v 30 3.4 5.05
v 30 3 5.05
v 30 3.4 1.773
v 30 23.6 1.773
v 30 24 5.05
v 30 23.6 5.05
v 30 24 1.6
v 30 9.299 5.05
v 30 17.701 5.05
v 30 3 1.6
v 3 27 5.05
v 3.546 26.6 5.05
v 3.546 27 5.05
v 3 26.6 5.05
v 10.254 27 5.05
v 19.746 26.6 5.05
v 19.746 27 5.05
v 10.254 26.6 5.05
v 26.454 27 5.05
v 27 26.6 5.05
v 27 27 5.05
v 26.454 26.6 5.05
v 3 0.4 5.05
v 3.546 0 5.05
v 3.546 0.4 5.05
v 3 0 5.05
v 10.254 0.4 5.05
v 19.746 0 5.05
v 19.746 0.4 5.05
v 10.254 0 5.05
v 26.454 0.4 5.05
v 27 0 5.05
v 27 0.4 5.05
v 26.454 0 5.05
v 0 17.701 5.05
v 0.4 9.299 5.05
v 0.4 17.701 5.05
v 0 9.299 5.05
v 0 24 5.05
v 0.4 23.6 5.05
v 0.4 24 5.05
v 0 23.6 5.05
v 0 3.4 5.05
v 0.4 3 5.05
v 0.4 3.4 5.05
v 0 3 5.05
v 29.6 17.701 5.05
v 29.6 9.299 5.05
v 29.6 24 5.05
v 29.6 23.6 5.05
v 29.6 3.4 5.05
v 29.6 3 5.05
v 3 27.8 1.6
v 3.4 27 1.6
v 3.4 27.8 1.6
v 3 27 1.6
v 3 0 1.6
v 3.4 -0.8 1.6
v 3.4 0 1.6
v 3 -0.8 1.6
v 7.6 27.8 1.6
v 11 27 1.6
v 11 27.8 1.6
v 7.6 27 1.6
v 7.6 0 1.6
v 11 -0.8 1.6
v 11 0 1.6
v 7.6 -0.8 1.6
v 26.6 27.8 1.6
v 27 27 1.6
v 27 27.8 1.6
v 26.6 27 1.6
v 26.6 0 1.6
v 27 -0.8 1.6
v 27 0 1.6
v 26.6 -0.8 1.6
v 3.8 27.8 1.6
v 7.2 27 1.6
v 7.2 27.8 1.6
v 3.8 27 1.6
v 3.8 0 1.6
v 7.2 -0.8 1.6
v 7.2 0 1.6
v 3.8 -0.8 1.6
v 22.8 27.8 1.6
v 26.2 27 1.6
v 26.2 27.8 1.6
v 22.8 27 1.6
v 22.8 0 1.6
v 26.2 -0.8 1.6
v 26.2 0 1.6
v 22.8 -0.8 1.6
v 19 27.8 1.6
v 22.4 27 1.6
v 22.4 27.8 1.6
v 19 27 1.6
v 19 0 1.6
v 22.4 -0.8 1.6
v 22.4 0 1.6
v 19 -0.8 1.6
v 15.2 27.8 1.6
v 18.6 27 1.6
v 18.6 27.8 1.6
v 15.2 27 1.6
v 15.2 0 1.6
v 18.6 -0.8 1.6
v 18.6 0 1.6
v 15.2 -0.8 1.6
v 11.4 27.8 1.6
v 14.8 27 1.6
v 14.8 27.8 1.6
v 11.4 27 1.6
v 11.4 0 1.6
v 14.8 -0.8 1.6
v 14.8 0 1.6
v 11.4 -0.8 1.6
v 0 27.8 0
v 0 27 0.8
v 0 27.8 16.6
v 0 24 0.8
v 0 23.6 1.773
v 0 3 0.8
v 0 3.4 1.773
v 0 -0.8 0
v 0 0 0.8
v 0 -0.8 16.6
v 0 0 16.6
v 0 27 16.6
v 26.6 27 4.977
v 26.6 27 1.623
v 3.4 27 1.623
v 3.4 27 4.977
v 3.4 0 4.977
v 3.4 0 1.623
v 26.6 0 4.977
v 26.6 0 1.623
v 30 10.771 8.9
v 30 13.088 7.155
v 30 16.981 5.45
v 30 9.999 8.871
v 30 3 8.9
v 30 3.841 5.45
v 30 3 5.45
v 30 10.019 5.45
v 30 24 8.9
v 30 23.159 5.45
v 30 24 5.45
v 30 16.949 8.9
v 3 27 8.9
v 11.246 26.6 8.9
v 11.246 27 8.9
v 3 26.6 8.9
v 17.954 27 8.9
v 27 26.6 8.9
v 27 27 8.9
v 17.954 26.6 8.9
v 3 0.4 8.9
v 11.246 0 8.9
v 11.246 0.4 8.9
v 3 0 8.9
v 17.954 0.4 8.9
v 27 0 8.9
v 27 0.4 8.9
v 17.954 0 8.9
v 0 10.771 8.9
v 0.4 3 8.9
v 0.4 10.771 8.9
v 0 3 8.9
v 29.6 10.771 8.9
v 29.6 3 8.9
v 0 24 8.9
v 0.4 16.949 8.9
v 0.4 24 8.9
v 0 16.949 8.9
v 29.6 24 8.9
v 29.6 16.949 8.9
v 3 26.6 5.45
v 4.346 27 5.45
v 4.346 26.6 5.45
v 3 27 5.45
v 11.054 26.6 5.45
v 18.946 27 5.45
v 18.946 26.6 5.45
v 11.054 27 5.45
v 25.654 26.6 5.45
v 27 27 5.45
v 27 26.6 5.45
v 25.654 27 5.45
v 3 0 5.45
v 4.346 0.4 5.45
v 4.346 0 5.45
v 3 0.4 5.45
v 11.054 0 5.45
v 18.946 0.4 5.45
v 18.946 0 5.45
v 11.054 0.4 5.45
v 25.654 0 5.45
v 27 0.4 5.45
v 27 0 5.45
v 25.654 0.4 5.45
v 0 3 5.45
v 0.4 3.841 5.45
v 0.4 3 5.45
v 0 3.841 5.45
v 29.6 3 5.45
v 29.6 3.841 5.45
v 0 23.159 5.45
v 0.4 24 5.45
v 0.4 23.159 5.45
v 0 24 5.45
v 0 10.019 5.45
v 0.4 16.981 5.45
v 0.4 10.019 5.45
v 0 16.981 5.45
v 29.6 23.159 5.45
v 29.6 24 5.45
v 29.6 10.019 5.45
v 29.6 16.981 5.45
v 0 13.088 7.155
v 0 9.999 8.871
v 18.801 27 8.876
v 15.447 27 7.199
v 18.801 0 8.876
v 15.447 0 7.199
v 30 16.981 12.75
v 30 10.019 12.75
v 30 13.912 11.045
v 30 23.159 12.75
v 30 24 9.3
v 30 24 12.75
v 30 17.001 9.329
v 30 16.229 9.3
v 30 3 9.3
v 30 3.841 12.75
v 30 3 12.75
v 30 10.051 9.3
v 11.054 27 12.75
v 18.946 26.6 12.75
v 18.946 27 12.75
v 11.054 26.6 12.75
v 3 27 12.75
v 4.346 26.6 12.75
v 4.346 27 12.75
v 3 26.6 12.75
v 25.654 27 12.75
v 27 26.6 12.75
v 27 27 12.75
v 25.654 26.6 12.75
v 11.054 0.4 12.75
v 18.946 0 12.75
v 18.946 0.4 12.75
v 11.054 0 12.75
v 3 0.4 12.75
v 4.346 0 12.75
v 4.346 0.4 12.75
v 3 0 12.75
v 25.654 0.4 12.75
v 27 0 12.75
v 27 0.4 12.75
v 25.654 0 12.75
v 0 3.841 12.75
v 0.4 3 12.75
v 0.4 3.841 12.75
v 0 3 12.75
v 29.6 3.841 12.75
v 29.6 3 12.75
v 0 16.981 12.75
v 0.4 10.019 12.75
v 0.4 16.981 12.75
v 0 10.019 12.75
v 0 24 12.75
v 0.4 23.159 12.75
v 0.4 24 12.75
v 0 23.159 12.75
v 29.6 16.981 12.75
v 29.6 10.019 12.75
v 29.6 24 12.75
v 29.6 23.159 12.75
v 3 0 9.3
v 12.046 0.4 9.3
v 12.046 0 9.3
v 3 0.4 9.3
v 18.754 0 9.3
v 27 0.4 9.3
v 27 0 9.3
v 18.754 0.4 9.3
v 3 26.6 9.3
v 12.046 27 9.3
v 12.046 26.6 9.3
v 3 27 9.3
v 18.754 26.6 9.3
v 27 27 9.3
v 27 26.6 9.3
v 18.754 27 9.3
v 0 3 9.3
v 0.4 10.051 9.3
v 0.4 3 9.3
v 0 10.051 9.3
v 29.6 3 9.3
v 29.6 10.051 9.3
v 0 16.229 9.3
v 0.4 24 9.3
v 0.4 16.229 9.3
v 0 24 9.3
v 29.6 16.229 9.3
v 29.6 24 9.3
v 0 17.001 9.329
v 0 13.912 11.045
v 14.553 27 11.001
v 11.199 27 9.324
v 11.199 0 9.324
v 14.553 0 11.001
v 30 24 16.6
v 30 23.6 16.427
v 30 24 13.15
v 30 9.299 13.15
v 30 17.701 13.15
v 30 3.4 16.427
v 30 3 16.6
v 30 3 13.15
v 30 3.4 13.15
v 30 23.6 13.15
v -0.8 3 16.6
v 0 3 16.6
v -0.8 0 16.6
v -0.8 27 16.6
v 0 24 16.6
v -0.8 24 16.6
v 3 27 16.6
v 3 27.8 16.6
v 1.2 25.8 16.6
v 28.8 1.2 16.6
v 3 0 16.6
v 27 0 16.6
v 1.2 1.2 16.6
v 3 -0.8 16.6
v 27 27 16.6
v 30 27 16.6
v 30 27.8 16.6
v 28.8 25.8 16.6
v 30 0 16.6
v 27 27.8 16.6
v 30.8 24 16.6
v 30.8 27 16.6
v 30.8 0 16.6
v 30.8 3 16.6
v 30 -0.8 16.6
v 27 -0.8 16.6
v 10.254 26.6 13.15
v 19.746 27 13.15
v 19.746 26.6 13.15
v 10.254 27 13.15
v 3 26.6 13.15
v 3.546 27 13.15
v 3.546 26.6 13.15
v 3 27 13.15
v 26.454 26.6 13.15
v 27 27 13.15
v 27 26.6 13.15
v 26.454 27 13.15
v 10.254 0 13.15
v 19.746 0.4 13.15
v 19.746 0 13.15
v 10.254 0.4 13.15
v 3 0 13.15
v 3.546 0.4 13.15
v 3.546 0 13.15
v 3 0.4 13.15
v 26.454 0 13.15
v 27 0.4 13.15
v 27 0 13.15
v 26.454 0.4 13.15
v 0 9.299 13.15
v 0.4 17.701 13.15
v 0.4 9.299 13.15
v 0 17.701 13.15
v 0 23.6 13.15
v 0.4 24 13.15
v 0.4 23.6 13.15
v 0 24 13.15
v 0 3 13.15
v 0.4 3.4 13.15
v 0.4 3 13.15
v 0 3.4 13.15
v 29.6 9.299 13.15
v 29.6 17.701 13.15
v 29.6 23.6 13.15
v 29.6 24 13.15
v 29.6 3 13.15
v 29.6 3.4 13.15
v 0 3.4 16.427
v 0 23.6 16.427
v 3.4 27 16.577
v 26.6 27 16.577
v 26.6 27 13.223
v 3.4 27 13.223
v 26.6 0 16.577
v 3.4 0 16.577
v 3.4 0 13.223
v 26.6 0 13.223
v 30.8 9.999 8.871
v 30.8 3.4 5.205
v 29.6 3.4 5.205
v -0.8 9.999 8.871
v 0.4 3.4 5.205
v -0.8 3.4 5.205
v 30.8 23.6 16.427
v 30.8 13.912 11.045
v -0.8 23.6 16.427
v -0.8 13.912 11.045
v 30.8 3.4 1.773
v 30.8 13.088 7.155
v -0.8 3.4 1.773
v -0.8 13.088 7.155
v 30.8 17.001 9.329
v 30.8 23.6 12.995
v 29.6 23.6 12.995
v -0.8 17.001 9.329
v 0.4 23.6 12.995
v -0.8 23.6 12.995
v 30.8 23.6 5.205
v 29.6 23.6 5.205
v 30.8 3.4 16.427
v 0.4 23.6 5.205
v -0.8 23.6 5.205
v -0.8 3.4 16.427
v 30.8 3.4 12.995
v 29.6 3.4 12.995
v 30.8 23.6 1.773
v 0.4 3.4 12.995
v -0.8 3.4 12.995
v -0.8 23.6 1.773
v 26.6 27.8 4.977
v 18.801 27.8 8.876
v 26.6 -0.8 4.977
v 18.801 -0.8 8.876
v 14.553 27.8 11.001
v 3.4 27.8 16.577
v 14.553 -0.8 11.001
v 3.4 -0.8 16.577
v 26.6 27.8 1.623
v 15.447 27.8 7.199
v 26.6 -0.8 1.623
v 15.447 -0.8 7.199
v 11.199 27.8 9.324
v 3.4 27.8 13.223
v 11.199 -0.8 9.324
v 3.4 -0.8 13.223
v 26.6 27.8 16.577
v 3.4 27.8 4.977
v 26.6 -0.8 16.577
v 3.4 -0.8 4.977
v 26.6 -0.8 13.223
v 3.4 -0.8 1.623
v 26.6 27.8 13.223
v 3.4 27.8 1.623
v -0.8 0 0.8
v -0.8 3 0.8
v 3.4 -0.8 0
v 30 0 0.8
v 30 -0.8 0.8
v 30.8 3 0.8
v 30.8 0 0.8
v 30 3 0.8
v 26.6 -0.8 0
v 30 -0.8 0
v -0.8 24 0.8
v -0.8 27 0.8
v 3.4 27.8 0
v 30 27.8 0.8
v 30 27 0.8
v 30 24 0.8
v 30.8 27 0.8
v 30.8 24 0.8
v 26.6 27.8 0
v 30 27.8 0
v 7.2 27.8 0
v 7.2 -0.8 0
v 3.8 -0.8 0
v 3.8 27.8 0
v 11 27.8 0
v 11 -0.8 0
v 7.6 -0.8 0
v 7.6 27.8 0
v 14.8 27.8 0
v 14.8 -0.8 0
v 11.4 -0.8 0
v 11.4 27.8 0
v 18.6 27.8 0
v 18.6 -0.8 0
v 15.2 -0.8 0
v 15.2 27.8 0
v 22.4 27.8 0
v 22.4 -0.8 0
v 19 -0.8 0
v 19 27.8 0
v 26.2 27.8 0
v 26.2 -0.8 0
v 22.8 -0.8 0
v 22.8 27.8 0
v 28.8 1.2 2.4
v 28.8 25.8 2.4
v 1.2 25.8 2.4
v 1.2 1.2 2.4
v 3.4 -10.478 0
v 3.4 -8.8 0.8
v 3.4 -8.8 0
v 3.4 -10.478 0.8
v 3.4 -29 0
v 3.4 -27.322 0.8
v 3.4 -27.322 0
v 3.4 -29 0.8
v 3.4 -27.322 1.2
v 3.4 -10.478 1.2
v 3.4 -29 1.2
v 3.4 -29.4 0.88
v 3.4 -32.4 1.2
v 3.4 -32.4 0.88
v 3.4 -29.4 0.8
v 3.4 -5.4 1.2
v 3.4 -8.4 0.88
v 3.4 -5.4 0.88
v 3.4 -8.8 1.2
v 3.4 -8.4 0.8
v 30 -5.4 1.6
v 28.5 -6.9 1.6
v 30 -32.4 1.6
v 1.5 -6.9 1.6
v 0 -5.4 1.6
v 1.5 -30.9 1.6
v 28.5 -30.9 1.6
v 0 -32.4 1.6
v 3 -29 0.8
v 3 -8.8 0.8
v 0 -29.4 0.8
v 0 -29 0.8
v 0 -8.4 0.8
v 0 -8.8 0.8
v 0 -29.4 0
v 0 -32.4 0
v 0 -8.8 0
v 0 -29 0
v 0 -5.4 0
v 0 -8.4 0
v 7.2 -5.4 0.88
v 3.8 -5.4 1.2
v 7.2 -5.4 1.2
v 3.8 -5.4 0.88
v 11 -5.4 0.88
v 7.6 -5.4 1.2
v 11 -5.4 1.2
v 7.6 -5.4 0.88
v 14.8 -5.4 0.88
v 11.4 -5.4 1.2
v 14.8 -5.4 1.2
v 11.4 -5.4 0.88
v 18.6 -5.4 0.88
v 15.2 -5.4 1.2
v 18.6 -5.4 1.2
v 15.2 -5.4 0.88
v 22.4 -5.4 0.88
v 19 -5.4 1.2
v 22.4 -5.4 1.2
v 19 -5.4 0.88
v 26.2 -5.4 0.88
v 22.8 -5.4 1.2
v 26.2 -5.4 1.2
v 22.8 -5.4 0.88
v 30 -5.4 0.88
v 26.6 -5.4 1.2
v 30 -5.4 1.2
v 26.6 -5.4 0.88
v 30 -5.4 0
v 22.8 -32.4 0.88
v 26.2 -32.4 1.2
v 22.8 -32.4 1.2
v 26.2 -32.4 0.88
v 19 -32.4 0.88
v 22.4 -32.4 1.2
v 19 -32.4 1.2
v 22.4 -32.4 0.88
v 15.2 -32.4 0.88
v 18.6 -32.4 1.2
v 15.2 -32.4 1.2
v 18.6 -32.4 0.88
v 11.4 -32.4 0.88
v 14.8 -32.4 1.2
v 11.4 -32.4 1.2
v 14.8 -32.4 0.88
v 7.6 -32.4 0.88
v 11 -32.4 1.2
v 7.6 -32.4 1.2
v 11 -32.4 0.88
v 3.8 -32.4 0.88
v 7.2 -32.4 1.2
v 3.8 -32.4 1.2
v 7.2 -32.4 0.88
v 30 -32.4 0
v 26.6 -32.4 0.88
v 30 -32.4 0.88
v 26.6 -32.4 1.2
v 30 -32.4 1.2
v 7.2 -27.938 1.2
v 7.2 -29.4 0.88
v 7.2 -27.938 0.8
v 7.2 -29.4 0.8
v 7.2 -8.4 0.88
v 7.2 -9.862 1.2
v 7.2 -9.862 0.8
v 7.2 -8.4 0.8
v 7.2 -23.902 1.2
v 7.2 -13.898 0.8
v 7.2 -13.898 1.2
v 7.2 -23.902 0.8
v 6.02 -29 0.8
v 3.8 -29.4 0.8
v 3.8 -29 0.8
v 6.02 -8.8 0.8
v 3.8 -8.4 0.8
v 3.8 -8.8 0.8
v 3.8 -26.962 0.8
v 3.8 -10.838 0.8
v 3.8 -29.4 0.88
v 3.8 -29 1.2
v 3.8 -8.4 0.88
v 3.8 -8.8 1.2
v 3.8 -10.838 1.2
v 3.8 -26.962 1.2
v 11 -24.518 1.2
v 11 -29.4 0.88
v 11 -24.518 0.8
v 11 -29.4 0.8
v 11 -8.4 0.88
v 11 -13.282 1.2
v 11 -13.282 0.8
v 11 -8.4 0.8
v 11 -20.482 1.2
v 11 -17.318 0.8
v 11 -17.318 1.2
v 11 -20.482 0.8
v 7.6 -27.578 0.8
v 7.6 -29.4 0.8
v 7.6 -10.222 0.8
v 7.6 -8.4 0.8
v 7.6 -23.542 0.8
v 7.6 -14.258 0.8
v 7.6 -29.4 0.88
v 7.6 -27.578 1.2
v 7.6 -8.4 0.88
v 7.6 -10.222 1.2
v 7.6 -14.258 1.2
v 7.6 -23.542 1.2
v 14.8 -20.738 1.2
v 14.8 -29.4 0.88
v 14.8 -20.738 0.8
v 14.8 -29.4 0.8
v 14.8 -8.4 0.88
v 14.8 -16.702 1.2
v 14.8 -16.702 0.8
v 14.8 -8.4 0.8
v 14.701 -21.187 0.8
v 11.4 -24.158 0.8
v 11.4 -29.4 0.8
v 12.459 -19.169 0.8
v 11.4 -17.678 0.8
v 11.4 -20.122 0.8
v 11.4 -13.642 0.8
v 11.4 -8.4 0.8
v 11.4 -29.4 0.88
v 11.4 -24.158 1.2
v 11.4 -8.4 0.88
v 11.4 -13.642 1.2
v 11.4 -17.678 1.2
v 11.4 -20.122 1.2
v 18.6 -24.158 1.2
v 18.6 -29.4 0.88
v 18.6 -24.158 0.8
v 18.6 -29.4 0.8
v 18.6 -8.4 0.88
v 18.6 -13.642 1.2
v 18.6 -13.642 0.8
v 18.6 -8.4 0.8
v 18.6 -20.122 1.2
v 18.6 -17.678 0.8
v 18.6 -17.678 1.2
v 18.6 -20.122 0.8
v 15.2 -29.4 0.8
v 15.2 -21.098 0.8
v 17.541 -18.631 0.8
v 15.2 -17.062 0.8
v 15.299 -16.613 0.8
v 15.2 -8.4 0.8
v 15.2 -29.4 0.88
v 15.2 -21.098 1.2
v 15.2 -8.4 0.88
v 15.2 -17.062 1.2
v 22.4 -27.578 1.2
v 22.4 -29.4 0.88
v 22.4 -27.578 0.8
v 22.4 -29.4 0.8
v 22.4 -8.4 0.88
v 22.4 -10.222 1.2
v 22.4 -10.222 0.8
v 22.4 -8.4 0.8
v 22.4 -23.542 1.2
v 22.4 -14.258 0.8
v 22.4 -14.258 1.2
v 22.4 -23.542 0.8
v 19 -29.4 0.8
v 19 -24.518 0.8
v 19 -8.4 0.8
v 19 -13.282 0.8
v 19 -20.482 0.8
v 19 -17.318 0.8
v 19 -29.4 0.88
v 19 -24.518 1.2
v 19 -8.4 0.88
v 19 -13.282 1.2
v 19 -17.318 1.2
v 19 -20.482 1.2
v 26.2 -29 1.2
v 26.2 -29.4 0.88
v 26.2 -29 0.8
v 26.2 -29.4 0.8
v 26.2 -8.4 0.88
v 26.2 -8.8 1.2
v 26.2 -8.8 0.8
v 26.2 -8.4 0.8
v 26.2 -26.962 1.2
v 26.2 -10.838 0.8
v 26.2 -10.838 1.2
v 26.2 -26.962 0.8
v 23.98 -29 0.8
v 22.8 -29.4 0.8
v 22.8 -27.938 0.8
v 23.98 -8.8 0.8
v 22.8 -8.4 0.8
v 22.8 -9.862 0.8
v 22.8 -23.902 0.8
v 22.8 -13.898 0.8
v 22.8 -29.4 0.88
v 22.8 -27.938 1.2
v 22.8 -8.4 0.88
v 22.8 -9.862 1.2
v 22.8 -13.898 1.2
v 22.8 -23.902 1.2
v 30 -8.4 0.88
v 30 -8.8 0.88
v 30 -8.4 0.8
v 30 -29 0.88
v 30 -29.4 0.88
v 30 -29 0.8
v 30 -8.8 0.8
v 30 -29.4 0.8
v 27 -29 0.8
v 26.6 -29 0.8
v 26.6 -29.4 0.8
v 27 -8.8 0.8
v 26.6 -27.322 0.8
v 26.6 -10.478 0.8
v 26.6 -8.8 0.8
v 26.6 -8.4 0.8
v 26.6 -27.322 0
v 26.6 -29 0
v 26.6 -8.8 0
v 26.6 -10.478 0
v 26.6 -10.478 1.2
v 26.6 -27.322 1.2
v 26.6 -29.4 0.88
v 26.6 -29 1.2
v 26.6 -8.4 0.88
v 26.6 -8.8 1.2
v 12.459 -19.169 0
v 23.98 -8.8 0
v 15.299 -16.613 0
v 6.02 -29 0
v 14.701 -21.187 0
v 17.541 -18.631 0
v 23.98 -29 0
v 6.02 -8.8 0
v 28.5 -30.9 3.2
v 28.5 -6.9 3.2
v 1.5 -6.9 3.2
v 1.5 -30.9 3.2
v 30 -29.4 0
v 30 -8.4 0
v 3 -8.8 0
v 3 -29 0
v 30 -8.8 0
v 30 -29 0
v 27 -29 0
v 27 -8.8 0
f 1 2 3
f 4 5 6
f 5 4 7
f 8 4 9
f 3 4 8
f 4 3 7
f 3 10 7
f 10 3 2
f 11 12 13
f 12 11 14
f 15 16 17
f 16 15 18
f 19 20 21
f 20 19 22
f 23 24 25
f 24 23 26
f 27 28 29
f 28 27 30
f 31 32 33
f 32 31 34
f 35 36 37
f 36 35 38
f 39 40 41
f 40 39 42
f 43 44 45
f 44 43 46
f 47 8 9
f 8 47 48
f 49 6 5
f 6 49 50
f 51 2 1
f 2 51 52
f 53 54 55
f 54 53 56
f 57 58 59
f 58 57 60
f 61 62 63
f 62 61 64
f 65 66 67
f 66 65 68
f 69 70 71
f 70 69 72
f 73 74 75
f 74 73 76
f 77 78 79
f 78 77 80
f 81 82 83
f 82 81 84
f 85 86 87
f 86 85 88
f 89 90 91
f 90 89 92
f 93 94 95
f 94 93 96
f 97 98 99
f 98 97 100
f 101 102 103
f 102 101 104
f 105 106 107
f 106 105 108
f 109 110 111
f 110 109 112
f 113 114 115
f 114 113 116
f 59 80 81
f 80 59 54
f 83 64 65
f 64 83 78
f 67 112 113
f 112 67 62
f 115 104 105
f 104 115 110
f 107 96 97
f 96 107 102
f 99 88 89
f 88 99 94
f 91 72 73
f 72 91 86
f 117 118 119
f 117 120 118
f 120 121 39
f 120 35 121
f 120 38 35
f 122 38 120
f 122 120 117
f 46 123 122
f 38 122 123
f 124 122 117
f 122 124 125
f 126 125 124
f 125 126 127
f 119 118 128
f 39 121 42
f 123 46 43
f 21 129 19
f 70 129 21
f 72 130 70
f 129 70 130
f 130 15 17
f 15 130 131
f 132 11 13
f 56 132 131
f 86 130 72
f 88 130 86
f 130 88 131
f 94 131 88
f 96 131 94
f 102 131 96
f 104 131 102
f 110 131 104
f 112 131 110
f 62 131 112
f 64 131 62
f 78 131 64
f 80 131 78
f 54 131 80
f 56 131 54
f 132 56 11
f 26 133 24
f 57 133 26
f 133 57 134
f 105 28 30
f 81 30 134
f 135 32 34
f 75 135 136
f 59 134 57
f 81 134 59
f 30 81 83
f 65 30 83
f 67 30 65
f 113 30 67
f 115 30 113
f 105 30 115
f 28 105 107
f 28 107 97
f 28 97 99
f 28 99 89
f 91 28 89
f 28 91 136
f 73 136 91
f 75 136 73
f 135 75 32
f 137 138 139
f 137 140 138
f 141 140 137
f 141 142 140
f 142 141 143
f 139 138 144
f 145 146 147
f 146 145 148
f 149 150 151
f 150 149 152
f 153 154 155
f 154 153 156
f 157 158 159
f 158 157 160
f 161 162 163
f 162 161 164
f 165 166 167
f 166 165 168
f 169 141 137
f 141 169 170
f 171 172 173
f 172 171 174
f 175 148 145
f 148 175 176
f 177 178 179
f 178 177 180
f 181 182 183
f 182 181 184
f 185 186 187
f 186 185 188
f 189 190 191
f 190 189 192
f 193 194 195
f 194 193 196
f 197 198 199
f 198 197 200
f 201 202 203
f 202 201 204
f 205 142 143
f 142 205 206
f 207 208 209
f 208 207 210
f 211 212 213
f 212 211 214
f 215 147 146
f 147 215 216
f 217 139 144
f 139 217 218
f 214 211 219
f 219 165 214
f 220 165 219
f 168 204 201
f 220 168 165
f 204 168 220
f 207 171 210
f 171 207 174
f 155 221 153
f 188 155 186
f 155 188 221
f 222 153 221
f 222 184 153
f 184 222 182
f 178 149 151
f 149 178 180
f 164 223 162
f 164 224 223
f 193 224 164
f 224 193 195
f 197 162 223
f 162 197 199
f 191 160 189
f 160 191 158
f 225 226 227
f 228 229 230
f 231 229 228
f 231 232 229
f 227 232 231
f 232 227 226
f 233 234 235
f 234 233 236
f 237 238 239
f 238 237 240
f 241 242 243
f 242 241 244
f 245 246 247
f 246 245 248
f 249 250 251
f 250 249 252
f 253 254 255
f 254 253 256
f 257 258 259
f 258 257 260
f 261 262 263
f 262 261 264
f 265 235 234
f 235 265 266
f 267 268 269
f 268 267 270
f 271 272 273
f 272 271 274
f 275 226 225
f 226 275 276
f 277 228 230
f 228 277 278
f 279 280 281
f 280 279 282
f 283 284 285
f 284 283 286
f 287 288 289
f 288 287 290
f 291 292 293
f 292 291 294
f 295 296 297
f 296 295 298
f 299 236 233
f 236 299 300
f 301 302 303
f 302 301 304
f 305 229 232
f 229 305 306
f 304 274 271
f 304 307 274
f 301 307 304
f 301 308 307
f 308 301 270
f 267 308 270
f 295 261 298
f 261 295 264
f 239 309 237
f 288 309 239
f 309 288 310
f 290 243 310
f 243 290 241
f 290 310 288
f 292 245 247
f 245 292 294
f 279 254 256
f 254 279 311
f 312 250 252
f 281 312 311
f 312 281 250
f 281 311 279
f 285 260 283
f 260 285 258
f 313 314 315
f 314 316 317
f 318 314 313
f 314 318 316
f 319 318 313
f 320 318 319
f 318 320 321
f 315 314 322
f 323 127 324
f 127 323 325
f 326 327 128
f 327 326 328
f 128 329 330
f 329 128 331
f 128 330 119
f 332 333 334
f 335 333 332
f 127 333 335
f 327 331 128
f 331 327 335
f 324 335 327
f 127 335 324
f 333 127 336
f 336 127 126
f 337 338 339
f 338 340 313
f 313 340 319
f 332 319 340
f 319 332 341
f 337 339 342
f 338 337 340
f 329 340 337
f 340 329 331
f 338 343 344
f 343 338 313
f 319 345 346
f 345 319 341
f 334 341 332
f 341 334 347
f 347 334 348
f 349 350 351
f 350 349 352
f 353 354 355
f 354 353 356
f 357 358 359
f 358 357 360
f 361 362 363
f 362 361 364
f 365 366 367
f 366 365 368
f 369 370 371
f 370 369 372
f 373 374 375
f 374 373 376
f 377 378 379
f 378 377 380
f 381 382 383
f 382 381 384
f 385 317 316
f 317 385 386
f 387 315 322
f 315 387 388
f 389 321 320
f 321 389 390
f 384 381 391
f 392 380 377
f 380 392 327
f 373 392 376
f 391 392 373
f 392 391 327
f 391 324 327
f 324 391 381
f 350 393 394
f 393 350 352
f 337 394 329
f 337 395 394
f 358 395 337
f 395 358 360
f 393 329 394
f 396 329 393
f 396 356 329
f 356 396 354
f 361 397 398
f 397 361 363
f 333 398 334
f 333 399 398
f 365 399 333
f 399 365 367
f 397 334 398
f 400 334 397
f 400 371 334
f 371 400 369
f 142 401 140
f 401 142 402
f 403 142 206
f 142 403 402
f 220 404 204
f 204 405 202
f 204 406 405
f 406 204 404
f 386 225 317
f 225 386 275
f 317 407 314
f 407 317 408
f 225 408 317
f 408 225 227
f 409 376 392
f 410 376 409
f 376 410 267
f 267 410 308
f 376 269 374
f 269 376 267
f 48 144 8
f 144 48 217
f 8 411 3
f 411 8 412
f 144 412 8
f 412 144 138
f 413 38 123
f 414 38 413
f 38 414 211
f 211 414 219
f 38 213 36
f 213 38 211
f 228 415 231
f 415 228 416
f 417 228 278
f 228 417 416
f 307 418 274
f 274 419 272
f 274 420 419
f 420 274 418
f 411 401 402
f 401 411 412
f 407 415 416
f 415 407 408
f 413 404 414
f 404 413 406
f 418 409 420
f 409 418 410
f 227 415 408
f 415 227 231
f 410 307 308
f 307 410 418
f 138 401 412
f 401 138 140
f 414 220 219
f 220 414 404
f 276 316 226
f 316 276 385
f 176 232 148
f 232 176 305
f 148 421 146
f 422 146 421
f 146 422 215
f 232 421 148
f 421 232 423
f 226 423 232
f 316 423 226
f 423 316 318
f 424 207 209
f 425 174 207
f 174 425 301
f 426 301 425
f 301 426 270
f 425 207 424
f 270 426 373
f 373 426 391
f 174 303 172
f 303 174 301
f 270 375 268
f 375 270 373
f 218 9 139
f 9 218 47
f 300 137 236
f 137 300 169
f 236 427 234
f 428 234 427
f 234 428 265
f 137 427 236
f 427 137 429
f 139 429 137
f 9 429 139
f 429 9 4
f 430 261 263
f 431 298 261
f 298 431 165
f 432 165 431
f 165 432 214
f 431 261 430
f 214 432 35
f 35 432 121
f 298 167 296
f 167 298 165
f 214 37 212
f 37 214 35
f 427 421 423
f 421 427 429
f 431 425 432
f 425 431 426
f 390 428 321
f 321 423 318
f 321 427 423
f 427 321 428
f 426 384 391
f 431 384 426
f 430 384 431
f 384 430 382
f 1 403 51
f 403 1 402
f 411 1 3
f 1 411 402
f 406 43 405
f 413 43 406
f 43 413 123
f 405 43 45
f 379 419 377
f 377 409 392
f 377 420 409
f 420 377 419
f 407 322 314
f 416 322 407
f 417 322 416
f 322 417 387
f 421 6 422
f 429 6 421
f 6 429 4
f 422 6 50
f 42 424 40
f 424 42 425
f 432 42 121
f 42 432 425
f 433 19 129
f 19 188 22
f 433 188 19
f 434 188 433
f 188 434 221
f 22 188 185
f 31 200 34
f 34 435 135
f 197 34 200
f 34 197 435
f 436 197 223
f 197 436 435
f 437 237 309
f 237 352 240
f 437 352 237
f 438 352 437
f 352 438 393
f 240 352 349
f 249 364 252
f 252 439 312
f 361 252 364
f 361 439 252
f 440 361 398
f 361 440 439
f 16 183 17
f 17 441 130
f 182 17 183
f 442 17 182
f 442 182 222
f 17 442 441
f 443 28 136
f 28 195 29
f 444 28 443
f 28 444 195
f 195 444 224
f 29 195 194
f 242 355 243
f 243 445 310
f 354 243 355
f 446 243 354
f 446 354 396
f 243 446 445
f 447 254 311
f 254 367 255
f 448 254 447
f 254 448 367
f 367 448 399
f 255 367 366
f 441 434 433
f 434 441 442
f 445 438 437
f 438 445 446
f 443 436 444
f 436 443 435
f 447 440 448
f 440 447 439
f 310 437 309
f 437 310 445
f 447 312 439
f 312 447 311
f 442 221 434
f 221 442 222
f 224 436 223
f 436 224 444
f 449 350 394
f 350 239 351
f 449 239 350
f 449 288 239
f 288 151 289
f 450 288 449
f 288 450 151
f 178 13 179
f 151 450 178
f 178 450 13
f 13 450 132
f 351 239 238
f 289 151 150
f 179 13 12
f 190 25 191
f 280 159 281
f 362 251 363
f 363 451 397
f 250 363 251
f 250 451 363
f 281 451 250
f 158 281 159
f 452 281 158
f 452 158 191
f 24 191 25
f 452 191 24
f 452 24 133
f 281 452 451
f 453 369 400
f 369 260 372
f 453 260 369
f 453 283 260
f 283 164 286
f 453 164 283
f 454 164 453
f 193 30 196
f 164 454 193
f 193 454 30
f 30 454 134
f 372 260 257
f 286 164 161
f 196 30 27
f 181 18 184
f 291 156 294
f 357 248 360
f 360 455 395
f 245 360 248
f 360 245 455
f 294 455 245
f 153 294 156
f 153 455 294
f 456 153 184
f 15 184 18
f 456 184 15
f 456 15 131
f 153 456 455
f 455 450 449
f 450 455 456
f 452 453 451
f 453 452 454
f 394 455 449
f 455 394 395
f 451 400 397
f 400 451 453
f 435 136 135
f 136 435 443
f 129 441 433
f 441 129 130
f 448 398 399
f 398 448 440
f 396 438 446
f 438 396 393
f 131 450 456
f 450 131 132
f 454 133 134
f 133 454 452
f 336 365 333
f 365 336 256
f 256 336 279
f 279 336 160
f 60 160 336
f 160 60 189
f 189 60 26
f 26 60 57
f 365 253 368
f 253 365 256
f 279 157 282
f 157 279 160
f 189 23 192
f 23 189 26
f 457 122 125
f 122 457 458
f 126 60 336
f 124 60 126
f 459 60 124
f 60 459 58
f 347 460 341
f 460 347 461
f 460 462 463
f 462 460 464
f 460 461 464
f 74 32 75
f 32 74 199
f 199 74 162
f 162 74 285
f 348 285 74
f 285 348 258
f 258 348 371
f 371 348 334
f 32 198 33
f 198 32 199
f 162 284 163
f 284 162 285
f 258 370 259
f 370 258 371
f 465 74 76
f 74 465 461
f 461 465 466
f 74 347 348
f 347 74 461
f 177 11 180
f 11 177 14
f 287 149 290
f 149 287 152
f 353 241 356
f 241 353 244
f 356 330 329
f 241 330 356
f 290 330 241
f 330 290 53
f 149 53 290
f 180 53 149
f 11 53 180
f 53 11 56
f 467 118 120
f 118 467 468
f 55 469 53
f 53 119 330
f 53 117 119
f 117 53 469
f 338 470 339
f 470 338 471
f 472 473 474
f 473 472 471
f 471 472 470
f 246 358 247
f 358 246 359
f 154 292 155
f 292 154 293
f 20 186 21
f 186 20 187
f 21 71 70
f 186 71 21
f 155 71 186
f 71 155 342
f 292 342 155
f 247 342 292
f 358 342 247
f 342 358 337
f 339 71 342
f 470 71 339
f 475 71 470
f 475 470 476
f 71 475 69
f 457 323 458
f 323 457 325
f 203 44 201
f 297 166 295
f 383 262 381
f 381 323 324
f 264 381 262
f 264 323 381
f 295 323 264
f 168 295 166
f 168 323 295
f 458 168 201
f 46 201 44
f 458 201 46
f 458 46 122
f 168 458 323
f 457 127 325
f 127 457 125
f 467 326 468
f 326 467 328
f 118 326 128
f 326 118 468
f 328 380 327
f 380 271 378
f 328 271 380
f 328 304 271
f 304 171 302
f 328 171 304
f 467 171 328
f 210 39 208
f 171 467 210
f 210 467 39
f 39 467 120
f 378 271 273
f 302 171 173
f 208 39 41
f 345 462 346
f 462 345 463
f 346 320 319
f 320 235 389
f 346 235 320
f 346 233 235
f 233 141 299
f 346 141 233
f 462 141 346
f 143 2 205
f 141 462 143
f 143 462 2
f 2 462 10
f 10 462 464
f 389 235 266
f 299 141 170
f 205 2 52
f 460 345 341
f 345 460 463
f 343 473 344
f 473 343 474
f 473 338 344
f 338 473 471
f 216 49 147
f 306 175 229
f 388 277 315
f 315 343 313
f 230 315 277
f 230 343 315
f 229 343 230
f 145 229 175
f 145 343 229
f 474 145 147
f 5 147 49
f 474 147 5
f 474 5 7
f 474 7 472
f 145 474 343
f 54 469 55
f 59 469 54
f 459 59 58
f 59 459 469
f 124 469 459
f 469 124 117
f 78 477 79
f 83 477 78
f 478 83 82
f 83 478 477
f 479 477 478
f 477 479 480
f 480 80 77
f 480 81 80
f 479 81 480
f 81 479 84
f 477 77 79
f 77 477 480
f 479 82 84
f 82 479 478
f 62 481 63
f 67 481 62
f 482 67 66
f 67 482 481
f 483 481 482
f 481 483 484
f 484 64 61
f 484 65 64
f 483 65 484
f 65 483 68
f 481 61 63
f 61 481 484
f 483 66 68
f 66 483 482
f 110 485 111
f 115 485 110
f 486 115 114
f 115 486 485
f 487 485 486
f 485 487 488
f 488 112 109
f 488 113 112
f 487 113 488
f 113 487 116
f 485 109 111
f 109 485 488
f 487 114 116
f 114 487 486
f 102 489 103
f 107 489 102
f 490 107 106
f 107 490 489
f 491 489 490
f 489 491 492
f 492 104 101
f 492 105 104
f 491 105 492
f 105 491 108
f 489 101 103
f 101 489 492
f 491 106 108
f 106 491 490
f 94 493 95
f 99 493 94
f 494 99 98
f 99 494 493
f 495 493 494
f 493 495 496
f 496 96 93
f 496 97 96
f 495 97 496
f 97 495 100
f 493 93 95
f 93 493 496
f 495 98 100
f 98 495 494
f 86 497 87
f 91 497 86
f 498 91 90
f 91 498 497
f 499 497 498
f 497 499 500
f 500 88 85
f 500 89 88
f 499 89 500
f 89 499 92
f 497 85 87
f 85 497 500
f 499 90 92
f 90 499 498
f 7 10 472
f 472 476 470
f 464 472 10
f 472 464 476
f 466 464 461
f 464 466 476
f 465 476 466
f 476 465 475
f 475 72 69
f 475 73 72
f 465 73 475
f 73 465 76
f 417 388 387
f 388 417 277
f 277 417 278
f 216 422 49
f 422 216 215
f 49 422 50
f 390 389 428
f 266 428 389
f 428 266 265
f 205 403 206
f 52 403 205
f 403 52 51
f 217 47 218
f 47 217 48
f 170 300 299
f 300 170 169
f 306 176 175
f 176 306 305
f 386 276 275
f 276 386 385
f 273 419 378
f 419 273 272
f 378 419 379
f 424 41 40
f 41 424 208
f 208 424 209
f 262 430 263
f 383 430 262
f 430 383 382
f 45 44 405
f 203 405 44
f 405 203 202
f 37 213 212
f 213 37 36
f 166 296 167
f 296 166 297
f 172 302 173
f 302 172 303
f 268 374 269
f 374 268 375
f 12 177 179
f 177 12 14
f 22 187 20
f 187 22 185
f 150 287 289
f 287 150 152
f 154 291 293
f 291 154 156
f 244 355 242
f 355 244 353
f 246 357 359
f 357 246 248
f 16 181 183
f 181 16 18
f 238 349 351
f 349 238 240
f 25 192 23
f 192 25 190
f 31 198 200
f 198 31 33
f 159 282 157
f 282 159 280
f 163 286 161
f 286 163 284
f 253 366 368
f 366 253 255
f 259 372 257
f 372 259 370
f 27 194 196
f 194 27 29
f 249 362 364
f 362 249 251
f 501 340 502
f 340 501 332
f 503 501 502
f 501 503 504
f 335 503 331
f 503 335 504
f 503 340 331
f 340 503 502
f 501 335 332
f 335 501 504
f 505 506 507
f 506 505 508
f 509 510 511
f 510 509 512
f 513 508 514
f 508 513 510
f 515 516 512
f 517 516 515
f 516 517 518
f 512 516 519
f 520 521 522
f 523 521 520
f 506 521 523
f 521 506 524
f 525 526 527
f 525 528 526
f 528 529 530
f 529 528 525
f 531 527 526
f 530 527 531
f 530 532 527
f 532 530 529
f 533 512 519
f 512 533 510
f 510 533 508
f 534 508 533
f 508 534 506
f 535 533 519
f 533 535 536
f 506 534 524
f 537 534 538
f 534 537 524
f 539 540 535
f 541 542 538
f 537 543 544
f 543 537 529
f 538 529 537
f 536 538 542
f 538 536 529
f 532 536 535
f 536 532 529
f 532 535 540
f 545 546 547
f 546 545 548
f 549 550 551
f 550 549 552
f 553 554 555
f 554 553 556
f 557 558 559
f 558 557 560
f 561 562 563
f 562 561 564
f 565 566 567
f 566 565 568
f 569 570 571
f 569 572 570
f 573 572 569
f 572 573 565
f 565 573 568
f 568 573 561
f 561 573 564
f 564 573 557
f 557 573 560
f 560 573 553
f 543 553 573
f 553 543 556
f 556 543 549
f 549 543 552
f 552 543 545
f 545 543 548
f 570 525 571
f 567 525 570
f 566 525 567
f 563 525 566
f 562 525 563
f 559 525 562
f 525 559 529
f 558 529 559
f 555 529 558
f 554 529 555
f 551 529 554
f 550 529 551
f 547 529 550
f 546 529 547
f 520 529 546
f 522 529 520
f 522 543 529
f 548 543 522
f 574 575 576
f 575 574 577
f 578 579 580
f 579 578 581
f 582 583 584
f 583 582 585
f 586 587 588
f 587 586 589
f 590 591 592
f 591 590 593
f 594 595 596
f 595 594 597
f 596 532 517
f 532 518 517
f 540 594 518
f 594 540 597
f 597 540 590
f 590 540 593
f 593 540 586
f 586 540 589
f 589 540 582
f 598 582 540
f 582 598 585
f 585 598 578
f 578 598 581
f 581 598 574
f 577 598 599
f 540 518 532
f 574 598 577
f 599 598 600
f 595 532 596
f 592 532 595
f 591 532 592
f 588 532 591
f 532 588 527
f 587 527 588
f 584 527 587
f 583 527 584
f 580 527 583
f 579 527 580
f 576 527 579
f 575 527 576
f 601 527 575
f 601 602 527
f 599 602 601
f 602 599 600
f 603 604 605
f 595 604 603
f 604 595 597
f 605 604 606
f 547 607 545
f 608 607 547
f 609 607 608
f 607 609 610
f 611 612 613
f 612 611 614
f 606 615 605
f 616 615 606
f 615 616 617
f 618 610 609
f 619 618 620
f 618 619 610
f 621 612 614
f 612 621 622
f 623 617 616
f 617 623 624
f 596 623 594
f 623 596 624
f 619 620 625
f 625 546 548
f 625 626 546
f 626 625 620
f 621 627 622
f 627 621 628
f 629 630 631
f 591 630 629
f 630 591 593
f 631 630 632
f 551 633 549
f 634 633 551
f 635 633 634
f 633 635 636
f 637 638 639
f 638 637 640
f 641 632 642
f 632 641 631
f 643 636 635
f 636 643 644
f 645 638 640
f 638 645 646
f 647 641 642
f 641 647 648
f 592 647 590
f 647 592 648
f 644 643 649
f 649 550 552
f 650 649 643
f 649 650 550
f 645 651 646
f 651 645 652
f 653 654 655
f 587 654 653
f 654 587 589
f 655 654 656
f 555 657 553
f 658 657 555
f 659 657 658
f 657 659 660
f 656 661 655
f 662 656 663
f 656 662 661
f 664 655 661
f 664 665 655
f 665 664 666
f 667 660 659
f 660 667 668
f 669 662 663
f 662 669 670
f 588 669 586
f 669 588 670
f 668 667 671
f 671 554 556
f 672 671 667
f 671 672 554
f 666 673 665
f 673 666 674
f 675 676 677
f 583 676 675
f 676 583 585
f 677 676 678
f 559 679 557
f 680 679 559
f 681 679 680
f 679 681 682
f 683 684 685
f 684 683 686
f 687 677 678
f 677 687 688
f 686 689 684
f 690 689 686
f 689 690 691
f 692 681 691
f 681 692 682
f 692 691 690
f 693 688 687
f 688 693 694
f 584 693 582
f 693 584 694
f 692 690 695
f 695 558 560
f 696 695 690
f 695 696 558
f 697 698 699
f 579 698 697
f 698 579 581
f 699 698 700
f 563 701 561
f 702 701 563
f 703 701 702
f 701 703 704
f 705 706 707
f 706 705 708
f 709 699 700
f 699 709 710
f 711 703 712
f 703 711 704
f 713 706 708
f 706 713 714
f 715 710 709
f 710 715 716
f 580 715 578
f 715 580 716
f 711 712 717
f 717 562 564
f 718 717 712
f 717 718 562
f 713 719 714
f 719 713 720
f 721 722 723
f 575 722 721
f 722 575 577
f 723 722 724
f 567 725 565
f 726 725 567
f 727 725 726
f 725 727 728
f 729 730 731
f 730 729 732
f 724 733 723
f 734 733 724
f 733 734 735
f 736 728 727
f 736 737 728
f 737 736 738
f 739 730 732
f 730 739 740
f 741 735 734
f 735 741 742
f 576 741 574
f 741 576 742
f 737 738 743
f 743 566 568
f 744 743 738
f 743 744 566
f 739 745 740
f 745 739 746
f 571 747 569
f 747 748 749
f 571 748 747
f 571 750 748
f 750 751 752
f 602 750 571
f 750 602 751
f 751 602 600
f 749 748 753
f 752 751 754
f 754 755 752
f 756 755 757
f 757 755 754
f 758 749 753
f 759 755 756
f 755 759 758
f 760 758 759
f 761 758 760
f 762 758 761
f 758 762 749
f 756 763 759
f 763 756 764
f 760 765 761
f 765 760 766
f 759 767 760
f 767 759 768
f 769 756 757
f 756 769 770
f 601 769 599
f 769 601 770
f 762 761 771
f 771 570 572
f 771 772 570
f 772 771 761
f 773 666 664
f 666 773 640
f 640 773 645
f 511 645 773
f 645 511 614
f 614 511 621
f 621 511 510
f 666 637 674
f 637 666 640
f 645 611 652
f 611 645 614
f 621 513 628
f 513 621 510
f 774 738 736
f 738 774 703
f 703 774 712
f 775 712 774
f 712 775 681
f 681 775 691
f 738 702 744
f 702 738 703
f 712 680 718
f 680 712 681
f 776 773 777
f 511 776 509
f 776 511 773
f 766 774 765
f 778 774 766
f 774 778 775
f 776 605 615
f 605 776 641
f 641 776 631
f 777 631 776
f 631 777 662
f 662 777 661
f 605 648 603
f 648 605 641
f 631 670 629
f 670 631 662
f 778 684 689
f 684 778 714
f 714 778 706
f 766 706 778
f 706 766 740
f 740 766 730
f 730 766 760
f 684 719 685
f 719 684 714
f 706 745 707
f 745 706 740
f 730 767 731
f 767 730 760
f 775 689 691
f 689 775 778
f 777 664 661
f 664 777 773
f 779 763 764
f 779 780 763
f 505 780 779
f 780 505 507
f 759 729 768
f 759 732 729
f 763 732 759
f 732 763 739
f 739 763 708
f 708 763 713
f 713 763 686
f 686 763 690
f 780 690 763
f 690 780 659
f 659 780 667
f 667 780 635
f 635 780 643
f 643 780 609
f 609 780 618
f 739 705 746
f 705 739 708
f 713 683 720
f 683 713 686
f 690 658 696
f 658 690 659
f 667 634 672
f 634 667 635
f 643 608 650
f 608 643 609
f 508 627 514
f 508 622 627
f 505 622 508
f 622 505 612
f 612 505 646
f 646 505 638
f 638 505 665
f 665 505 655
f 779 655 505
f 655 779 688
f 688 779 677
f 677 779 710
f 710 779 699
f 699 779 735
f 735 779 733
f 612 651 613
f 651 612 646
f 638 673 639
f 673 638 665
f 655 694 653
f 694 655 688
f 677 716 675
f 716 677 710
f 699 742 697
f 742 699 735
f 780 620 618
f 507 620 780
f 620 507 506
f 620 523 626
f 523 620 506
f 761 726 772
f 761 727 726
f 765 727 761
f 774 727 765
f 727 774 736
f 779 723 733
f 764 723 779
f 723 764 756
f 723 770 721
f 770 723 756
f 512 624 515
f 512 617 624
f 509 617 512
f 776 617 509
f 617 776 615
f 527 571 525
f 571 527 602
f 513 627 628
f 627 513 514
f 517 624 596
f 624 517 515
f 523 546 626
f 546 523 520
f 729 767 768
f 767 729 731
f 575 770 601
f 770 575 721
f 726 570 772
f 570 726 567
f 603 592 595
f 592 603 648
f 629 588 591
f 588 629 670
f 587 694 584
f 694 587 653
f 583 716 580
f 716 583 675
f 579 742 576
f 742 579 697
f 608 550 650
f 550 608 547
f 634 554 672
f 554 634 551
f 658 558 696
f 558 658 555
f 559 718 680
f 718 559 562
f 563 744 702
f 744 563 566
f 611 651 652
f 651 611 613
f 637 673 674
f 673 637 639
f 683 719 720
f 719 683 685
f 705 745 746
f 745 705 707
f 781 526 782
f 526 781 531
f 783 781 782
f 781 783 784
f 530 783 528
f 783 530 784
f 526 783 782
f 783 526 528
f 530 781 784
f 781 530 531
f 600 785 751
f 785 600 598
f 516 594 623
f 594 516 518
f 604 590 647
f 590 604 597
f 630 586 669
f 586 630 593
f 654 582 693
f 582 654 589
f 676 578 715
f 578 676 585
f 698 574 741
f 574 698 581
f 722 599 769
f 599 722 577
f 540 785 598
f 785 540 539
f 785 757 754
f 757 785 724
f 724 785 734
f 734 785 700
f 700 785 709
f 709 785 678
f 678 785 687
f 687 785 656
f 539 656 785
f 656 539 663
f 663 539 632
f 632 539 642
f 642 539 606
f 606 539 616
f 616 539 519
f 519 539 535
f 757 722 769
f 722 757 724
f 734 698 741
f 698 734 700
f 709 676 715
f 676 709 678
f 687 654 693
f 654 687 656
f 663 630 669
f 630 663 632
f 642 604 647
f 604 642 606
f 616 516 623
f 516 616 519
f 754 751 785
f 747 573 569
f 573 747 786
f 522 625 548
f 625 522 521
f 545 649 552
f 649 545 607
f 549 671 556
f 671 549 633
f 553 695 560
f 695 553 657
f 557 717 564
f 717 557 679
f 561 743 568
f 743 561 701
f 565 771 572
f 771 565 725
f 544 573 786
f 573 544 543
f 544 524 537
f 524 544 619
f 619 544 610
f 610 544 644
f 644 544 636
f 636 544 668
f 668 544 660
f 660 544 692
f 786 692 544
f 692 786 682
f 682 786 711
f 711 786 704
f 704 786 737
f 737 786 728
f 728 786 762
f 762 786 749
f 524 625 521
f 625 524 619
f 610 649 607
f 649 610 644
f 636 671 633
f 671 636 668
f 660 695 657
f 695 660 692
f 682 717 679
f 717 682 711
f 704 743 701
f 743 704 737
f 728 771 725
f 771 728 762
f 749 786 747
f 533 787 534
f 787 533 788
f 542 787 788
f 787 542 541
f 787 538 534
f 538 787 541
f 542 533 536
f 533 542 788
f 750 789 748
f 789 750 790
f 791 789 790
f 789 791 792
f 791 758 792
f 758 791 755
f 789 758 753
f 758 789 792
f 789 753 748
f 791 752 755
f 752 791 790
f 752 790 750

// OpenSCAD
/* [Parameters] */
parts = 3; // [3:both, 1:box_only, 2:lid_only]

width = 30;
height = 15;
depth = 27;

/* [Hidden] */
$fn = 32;

boardGap = 0.4;
boardThick = 0.8;
boardWidth = 3;
clearance = 0.3;


function getAdjustedNum(total, start, gap) = floor(total / (start + gap));
function getAdjustedDimension(total, start, gap) = (total - (floor(total / (start + gap))-1)*gap)/floor(total / (start + gap));

module crossPieces(w, h, d, both)
{
    crossW = sqrt(w*w+h*h);
    
    angle = atan(h/w);

    intersection() {
    
        if (both)
        {
            union() {
                difference() {
                    translate([w*0.5, d*0.5, h*0.5])
                    rotate([0, angle, 0])
                    cube([crossW*1.5, d+(boardThick*2), boardWidth], center=true);

                    translate([w*0.5, d*0.5, h*0.5])
                    rotate([0, -angle, 0])
                    cube([crossW*1.5, d+(boardThick*4), boardWidth+(boardGap*2)], center=true);
                }
            
            
            translate([w*0.5, d*0.5, h*0.5])
            rotate([0, -angle, 0])
            cube([crossW*1.5, d+(boardThick*2), boardWidth], center=true);
            }

        }
        else
        {
            translate([w*0.5, d*0.5, h*0.5])
            rotate([0, -angle, 0])
            cube([crossW*1.5, d+(boardThick*2), boardWidth], center=true);
            
        }
        
    
    translate([w/2,d/2,h/2])
    cube([w-(boardWidth+boardGap)*2,d+(boardThick*4),h-(boardWidth+boardGap)*0], center=true);
}
}


module sidePanels(w, h, d)
{
    numH = getAdjustedNum(h, boardWidth, boardGap);
    bH = getAdjustedDimension(h, boardWidth, boardGap);
    
    for (i=[0:numH-1])
    {
        translate([0, 0, i*(bH+boardGap)])
        cube([w, d, bH]);
    }
    
}


module corners(w,h,d)
{
    translate([0,-boardThick,-boardThick])
    cube([boardWidth, boardThick*2, h+boardThick]);

    translate([w-boardWidth,-boardThick,-boardThick])
    cube([boardWidth, boardThick*2, h+boardThick]);

    translate([0,d-boardThick,-boardThick])
    cube([boardWidth, boardThick*2, h+boardThick]);

    translate([w-boardWidth,d-boardThick,-boardThick])
    cube([boardWidth, boardThick*2, h+boardThick]);


    translate([-boardThick,0,-boardThick])
    cube([boardThick*2, boardWidth, h+boardThick]);

    translate([-boardThick,d-boardWidth,-boardThick])
    cube([boardThick*2, boardWidth, h+boardThick]);

    translate([w-boardThick,0,-boardThick])
    cube([boardThick*2, boardWidth, h+boardThick]);

    translate([w-boardThick,d-boardWidth,-boardThick])
    cube([boardThick*2, boardWidth, h+boardThick]);
}


module bottom(w, h, d)
{
    numW = getAdjustedNum(w, boardWidth, boardGap);
    bW = getAdjustedDimension(w, boardWidth, boardGap);
    
    for (i=[0:numW-1])
    {
        translate([i*(bW+boardGap),-boardThick,-boardThick*2])
        cube([bW, d+(boardThick*2), boardThick*2]);
    }
    
}


module crate(w, h, d)
{
    difference() {
        union() {
            sidePanels(w,h,d);
            
            rotate([0,0,-90])
            translate([-d,0,0])
            crossPieces(d, h, w, true);
            
            crossPieces(w, h, d, true);
            
            corners(w,h,d);
            bottom(w,h,d);

            // central part
            translate([boardGap, boardGap, 0])
            cube([w-(boardGap*2), d-(boardGap*2),h]);
        }
        
        adjust = (boardGap+boardThick) * 2;
        translate([adjust/2, adjust/2, boardThick])
        cube([w-adjust, d-adjust, h]);
    }
}


module lid(w, h, d)
{
    union() {
        numW = getAdjustedNum(w, boardWidth, boardGap);
        bW = getAdjustedDimension(w, boardWidth, boardGap);

        adjust = boardWidth + boardGap;        
        edgeClear = (boardGap+boardThick+clearance) * 2;
        
        for (i=[0:numW-1])
        {
            translate([i*(bW+boardGap),0,-boardThick])
            cube([bW, d, boardThick*1]);
        }
                
        translate([0,0,-boardGap])
        cube([w,d, boardGap]);
        
        translate([edgeClear/2, edgeClear/2, 0])
        cube([w-edgeClear,d-edgeClear, boardThick*2]);
        
        angle = atan(d/w);
        crossL = sqrt(w*w+d*d);
        
        // cross beams
        intersection() {
            union() {
                difference() {
                translate([w/2,d/2, -boardThick])
                rotate([0,0,angle])
                cube([crossL, boardWidth, boardThick*2], center=true);
                
                translate([w/2,d/2, -boardThick*(0.5)])
                rotate([0,0,-angle])
                cube([crossL, boardWidth+(boardGap*2), boardThick*4], center=true);
                }

                translate([w/2,d/2, -boardThick])
                rotate([0,0,-angle])
                cube([crossL, boardWidth, boardThick*2], center=true);
            }
            
            
            adjust = (boardWidth+boardGap)*2;
            translate([adjust/2,adjust/2,-boardThick*2.5])
            cube([w-adjust, d-adjust, boardThick*5]);
        }
        
        
        translate([0,0,-boardThick*2])
        cube([w, boardWidth, boardThick*1.1]);

        translate([0,d-boardWidth,-boardThick*2])
        cube([w, boardWidth, boardThick*1.1]);

        translate([0,adjust,-boardThick*2])
        cube([boardWidth, d-((boardWidth+boardGap)*2), boardThick*1.1]);

        translate([w-boardWidth,adjust,-boardThick*2])
        cube([boardWidth, d-((boardWidth+boardGap)*2), boardThick*1.1]);
    }
}



translate([0,0,boardThick*2])
{
    if (parts > 0) {
    
        if (parts % 2 == 1) {
                crate(width, height, depth);        
        }
        
        if (parts > 1) {
            // rotate([180,0,0])
            translate([0,-depth*1.2,0])
            lid(width, height, depth);
        }
    
    }
}
